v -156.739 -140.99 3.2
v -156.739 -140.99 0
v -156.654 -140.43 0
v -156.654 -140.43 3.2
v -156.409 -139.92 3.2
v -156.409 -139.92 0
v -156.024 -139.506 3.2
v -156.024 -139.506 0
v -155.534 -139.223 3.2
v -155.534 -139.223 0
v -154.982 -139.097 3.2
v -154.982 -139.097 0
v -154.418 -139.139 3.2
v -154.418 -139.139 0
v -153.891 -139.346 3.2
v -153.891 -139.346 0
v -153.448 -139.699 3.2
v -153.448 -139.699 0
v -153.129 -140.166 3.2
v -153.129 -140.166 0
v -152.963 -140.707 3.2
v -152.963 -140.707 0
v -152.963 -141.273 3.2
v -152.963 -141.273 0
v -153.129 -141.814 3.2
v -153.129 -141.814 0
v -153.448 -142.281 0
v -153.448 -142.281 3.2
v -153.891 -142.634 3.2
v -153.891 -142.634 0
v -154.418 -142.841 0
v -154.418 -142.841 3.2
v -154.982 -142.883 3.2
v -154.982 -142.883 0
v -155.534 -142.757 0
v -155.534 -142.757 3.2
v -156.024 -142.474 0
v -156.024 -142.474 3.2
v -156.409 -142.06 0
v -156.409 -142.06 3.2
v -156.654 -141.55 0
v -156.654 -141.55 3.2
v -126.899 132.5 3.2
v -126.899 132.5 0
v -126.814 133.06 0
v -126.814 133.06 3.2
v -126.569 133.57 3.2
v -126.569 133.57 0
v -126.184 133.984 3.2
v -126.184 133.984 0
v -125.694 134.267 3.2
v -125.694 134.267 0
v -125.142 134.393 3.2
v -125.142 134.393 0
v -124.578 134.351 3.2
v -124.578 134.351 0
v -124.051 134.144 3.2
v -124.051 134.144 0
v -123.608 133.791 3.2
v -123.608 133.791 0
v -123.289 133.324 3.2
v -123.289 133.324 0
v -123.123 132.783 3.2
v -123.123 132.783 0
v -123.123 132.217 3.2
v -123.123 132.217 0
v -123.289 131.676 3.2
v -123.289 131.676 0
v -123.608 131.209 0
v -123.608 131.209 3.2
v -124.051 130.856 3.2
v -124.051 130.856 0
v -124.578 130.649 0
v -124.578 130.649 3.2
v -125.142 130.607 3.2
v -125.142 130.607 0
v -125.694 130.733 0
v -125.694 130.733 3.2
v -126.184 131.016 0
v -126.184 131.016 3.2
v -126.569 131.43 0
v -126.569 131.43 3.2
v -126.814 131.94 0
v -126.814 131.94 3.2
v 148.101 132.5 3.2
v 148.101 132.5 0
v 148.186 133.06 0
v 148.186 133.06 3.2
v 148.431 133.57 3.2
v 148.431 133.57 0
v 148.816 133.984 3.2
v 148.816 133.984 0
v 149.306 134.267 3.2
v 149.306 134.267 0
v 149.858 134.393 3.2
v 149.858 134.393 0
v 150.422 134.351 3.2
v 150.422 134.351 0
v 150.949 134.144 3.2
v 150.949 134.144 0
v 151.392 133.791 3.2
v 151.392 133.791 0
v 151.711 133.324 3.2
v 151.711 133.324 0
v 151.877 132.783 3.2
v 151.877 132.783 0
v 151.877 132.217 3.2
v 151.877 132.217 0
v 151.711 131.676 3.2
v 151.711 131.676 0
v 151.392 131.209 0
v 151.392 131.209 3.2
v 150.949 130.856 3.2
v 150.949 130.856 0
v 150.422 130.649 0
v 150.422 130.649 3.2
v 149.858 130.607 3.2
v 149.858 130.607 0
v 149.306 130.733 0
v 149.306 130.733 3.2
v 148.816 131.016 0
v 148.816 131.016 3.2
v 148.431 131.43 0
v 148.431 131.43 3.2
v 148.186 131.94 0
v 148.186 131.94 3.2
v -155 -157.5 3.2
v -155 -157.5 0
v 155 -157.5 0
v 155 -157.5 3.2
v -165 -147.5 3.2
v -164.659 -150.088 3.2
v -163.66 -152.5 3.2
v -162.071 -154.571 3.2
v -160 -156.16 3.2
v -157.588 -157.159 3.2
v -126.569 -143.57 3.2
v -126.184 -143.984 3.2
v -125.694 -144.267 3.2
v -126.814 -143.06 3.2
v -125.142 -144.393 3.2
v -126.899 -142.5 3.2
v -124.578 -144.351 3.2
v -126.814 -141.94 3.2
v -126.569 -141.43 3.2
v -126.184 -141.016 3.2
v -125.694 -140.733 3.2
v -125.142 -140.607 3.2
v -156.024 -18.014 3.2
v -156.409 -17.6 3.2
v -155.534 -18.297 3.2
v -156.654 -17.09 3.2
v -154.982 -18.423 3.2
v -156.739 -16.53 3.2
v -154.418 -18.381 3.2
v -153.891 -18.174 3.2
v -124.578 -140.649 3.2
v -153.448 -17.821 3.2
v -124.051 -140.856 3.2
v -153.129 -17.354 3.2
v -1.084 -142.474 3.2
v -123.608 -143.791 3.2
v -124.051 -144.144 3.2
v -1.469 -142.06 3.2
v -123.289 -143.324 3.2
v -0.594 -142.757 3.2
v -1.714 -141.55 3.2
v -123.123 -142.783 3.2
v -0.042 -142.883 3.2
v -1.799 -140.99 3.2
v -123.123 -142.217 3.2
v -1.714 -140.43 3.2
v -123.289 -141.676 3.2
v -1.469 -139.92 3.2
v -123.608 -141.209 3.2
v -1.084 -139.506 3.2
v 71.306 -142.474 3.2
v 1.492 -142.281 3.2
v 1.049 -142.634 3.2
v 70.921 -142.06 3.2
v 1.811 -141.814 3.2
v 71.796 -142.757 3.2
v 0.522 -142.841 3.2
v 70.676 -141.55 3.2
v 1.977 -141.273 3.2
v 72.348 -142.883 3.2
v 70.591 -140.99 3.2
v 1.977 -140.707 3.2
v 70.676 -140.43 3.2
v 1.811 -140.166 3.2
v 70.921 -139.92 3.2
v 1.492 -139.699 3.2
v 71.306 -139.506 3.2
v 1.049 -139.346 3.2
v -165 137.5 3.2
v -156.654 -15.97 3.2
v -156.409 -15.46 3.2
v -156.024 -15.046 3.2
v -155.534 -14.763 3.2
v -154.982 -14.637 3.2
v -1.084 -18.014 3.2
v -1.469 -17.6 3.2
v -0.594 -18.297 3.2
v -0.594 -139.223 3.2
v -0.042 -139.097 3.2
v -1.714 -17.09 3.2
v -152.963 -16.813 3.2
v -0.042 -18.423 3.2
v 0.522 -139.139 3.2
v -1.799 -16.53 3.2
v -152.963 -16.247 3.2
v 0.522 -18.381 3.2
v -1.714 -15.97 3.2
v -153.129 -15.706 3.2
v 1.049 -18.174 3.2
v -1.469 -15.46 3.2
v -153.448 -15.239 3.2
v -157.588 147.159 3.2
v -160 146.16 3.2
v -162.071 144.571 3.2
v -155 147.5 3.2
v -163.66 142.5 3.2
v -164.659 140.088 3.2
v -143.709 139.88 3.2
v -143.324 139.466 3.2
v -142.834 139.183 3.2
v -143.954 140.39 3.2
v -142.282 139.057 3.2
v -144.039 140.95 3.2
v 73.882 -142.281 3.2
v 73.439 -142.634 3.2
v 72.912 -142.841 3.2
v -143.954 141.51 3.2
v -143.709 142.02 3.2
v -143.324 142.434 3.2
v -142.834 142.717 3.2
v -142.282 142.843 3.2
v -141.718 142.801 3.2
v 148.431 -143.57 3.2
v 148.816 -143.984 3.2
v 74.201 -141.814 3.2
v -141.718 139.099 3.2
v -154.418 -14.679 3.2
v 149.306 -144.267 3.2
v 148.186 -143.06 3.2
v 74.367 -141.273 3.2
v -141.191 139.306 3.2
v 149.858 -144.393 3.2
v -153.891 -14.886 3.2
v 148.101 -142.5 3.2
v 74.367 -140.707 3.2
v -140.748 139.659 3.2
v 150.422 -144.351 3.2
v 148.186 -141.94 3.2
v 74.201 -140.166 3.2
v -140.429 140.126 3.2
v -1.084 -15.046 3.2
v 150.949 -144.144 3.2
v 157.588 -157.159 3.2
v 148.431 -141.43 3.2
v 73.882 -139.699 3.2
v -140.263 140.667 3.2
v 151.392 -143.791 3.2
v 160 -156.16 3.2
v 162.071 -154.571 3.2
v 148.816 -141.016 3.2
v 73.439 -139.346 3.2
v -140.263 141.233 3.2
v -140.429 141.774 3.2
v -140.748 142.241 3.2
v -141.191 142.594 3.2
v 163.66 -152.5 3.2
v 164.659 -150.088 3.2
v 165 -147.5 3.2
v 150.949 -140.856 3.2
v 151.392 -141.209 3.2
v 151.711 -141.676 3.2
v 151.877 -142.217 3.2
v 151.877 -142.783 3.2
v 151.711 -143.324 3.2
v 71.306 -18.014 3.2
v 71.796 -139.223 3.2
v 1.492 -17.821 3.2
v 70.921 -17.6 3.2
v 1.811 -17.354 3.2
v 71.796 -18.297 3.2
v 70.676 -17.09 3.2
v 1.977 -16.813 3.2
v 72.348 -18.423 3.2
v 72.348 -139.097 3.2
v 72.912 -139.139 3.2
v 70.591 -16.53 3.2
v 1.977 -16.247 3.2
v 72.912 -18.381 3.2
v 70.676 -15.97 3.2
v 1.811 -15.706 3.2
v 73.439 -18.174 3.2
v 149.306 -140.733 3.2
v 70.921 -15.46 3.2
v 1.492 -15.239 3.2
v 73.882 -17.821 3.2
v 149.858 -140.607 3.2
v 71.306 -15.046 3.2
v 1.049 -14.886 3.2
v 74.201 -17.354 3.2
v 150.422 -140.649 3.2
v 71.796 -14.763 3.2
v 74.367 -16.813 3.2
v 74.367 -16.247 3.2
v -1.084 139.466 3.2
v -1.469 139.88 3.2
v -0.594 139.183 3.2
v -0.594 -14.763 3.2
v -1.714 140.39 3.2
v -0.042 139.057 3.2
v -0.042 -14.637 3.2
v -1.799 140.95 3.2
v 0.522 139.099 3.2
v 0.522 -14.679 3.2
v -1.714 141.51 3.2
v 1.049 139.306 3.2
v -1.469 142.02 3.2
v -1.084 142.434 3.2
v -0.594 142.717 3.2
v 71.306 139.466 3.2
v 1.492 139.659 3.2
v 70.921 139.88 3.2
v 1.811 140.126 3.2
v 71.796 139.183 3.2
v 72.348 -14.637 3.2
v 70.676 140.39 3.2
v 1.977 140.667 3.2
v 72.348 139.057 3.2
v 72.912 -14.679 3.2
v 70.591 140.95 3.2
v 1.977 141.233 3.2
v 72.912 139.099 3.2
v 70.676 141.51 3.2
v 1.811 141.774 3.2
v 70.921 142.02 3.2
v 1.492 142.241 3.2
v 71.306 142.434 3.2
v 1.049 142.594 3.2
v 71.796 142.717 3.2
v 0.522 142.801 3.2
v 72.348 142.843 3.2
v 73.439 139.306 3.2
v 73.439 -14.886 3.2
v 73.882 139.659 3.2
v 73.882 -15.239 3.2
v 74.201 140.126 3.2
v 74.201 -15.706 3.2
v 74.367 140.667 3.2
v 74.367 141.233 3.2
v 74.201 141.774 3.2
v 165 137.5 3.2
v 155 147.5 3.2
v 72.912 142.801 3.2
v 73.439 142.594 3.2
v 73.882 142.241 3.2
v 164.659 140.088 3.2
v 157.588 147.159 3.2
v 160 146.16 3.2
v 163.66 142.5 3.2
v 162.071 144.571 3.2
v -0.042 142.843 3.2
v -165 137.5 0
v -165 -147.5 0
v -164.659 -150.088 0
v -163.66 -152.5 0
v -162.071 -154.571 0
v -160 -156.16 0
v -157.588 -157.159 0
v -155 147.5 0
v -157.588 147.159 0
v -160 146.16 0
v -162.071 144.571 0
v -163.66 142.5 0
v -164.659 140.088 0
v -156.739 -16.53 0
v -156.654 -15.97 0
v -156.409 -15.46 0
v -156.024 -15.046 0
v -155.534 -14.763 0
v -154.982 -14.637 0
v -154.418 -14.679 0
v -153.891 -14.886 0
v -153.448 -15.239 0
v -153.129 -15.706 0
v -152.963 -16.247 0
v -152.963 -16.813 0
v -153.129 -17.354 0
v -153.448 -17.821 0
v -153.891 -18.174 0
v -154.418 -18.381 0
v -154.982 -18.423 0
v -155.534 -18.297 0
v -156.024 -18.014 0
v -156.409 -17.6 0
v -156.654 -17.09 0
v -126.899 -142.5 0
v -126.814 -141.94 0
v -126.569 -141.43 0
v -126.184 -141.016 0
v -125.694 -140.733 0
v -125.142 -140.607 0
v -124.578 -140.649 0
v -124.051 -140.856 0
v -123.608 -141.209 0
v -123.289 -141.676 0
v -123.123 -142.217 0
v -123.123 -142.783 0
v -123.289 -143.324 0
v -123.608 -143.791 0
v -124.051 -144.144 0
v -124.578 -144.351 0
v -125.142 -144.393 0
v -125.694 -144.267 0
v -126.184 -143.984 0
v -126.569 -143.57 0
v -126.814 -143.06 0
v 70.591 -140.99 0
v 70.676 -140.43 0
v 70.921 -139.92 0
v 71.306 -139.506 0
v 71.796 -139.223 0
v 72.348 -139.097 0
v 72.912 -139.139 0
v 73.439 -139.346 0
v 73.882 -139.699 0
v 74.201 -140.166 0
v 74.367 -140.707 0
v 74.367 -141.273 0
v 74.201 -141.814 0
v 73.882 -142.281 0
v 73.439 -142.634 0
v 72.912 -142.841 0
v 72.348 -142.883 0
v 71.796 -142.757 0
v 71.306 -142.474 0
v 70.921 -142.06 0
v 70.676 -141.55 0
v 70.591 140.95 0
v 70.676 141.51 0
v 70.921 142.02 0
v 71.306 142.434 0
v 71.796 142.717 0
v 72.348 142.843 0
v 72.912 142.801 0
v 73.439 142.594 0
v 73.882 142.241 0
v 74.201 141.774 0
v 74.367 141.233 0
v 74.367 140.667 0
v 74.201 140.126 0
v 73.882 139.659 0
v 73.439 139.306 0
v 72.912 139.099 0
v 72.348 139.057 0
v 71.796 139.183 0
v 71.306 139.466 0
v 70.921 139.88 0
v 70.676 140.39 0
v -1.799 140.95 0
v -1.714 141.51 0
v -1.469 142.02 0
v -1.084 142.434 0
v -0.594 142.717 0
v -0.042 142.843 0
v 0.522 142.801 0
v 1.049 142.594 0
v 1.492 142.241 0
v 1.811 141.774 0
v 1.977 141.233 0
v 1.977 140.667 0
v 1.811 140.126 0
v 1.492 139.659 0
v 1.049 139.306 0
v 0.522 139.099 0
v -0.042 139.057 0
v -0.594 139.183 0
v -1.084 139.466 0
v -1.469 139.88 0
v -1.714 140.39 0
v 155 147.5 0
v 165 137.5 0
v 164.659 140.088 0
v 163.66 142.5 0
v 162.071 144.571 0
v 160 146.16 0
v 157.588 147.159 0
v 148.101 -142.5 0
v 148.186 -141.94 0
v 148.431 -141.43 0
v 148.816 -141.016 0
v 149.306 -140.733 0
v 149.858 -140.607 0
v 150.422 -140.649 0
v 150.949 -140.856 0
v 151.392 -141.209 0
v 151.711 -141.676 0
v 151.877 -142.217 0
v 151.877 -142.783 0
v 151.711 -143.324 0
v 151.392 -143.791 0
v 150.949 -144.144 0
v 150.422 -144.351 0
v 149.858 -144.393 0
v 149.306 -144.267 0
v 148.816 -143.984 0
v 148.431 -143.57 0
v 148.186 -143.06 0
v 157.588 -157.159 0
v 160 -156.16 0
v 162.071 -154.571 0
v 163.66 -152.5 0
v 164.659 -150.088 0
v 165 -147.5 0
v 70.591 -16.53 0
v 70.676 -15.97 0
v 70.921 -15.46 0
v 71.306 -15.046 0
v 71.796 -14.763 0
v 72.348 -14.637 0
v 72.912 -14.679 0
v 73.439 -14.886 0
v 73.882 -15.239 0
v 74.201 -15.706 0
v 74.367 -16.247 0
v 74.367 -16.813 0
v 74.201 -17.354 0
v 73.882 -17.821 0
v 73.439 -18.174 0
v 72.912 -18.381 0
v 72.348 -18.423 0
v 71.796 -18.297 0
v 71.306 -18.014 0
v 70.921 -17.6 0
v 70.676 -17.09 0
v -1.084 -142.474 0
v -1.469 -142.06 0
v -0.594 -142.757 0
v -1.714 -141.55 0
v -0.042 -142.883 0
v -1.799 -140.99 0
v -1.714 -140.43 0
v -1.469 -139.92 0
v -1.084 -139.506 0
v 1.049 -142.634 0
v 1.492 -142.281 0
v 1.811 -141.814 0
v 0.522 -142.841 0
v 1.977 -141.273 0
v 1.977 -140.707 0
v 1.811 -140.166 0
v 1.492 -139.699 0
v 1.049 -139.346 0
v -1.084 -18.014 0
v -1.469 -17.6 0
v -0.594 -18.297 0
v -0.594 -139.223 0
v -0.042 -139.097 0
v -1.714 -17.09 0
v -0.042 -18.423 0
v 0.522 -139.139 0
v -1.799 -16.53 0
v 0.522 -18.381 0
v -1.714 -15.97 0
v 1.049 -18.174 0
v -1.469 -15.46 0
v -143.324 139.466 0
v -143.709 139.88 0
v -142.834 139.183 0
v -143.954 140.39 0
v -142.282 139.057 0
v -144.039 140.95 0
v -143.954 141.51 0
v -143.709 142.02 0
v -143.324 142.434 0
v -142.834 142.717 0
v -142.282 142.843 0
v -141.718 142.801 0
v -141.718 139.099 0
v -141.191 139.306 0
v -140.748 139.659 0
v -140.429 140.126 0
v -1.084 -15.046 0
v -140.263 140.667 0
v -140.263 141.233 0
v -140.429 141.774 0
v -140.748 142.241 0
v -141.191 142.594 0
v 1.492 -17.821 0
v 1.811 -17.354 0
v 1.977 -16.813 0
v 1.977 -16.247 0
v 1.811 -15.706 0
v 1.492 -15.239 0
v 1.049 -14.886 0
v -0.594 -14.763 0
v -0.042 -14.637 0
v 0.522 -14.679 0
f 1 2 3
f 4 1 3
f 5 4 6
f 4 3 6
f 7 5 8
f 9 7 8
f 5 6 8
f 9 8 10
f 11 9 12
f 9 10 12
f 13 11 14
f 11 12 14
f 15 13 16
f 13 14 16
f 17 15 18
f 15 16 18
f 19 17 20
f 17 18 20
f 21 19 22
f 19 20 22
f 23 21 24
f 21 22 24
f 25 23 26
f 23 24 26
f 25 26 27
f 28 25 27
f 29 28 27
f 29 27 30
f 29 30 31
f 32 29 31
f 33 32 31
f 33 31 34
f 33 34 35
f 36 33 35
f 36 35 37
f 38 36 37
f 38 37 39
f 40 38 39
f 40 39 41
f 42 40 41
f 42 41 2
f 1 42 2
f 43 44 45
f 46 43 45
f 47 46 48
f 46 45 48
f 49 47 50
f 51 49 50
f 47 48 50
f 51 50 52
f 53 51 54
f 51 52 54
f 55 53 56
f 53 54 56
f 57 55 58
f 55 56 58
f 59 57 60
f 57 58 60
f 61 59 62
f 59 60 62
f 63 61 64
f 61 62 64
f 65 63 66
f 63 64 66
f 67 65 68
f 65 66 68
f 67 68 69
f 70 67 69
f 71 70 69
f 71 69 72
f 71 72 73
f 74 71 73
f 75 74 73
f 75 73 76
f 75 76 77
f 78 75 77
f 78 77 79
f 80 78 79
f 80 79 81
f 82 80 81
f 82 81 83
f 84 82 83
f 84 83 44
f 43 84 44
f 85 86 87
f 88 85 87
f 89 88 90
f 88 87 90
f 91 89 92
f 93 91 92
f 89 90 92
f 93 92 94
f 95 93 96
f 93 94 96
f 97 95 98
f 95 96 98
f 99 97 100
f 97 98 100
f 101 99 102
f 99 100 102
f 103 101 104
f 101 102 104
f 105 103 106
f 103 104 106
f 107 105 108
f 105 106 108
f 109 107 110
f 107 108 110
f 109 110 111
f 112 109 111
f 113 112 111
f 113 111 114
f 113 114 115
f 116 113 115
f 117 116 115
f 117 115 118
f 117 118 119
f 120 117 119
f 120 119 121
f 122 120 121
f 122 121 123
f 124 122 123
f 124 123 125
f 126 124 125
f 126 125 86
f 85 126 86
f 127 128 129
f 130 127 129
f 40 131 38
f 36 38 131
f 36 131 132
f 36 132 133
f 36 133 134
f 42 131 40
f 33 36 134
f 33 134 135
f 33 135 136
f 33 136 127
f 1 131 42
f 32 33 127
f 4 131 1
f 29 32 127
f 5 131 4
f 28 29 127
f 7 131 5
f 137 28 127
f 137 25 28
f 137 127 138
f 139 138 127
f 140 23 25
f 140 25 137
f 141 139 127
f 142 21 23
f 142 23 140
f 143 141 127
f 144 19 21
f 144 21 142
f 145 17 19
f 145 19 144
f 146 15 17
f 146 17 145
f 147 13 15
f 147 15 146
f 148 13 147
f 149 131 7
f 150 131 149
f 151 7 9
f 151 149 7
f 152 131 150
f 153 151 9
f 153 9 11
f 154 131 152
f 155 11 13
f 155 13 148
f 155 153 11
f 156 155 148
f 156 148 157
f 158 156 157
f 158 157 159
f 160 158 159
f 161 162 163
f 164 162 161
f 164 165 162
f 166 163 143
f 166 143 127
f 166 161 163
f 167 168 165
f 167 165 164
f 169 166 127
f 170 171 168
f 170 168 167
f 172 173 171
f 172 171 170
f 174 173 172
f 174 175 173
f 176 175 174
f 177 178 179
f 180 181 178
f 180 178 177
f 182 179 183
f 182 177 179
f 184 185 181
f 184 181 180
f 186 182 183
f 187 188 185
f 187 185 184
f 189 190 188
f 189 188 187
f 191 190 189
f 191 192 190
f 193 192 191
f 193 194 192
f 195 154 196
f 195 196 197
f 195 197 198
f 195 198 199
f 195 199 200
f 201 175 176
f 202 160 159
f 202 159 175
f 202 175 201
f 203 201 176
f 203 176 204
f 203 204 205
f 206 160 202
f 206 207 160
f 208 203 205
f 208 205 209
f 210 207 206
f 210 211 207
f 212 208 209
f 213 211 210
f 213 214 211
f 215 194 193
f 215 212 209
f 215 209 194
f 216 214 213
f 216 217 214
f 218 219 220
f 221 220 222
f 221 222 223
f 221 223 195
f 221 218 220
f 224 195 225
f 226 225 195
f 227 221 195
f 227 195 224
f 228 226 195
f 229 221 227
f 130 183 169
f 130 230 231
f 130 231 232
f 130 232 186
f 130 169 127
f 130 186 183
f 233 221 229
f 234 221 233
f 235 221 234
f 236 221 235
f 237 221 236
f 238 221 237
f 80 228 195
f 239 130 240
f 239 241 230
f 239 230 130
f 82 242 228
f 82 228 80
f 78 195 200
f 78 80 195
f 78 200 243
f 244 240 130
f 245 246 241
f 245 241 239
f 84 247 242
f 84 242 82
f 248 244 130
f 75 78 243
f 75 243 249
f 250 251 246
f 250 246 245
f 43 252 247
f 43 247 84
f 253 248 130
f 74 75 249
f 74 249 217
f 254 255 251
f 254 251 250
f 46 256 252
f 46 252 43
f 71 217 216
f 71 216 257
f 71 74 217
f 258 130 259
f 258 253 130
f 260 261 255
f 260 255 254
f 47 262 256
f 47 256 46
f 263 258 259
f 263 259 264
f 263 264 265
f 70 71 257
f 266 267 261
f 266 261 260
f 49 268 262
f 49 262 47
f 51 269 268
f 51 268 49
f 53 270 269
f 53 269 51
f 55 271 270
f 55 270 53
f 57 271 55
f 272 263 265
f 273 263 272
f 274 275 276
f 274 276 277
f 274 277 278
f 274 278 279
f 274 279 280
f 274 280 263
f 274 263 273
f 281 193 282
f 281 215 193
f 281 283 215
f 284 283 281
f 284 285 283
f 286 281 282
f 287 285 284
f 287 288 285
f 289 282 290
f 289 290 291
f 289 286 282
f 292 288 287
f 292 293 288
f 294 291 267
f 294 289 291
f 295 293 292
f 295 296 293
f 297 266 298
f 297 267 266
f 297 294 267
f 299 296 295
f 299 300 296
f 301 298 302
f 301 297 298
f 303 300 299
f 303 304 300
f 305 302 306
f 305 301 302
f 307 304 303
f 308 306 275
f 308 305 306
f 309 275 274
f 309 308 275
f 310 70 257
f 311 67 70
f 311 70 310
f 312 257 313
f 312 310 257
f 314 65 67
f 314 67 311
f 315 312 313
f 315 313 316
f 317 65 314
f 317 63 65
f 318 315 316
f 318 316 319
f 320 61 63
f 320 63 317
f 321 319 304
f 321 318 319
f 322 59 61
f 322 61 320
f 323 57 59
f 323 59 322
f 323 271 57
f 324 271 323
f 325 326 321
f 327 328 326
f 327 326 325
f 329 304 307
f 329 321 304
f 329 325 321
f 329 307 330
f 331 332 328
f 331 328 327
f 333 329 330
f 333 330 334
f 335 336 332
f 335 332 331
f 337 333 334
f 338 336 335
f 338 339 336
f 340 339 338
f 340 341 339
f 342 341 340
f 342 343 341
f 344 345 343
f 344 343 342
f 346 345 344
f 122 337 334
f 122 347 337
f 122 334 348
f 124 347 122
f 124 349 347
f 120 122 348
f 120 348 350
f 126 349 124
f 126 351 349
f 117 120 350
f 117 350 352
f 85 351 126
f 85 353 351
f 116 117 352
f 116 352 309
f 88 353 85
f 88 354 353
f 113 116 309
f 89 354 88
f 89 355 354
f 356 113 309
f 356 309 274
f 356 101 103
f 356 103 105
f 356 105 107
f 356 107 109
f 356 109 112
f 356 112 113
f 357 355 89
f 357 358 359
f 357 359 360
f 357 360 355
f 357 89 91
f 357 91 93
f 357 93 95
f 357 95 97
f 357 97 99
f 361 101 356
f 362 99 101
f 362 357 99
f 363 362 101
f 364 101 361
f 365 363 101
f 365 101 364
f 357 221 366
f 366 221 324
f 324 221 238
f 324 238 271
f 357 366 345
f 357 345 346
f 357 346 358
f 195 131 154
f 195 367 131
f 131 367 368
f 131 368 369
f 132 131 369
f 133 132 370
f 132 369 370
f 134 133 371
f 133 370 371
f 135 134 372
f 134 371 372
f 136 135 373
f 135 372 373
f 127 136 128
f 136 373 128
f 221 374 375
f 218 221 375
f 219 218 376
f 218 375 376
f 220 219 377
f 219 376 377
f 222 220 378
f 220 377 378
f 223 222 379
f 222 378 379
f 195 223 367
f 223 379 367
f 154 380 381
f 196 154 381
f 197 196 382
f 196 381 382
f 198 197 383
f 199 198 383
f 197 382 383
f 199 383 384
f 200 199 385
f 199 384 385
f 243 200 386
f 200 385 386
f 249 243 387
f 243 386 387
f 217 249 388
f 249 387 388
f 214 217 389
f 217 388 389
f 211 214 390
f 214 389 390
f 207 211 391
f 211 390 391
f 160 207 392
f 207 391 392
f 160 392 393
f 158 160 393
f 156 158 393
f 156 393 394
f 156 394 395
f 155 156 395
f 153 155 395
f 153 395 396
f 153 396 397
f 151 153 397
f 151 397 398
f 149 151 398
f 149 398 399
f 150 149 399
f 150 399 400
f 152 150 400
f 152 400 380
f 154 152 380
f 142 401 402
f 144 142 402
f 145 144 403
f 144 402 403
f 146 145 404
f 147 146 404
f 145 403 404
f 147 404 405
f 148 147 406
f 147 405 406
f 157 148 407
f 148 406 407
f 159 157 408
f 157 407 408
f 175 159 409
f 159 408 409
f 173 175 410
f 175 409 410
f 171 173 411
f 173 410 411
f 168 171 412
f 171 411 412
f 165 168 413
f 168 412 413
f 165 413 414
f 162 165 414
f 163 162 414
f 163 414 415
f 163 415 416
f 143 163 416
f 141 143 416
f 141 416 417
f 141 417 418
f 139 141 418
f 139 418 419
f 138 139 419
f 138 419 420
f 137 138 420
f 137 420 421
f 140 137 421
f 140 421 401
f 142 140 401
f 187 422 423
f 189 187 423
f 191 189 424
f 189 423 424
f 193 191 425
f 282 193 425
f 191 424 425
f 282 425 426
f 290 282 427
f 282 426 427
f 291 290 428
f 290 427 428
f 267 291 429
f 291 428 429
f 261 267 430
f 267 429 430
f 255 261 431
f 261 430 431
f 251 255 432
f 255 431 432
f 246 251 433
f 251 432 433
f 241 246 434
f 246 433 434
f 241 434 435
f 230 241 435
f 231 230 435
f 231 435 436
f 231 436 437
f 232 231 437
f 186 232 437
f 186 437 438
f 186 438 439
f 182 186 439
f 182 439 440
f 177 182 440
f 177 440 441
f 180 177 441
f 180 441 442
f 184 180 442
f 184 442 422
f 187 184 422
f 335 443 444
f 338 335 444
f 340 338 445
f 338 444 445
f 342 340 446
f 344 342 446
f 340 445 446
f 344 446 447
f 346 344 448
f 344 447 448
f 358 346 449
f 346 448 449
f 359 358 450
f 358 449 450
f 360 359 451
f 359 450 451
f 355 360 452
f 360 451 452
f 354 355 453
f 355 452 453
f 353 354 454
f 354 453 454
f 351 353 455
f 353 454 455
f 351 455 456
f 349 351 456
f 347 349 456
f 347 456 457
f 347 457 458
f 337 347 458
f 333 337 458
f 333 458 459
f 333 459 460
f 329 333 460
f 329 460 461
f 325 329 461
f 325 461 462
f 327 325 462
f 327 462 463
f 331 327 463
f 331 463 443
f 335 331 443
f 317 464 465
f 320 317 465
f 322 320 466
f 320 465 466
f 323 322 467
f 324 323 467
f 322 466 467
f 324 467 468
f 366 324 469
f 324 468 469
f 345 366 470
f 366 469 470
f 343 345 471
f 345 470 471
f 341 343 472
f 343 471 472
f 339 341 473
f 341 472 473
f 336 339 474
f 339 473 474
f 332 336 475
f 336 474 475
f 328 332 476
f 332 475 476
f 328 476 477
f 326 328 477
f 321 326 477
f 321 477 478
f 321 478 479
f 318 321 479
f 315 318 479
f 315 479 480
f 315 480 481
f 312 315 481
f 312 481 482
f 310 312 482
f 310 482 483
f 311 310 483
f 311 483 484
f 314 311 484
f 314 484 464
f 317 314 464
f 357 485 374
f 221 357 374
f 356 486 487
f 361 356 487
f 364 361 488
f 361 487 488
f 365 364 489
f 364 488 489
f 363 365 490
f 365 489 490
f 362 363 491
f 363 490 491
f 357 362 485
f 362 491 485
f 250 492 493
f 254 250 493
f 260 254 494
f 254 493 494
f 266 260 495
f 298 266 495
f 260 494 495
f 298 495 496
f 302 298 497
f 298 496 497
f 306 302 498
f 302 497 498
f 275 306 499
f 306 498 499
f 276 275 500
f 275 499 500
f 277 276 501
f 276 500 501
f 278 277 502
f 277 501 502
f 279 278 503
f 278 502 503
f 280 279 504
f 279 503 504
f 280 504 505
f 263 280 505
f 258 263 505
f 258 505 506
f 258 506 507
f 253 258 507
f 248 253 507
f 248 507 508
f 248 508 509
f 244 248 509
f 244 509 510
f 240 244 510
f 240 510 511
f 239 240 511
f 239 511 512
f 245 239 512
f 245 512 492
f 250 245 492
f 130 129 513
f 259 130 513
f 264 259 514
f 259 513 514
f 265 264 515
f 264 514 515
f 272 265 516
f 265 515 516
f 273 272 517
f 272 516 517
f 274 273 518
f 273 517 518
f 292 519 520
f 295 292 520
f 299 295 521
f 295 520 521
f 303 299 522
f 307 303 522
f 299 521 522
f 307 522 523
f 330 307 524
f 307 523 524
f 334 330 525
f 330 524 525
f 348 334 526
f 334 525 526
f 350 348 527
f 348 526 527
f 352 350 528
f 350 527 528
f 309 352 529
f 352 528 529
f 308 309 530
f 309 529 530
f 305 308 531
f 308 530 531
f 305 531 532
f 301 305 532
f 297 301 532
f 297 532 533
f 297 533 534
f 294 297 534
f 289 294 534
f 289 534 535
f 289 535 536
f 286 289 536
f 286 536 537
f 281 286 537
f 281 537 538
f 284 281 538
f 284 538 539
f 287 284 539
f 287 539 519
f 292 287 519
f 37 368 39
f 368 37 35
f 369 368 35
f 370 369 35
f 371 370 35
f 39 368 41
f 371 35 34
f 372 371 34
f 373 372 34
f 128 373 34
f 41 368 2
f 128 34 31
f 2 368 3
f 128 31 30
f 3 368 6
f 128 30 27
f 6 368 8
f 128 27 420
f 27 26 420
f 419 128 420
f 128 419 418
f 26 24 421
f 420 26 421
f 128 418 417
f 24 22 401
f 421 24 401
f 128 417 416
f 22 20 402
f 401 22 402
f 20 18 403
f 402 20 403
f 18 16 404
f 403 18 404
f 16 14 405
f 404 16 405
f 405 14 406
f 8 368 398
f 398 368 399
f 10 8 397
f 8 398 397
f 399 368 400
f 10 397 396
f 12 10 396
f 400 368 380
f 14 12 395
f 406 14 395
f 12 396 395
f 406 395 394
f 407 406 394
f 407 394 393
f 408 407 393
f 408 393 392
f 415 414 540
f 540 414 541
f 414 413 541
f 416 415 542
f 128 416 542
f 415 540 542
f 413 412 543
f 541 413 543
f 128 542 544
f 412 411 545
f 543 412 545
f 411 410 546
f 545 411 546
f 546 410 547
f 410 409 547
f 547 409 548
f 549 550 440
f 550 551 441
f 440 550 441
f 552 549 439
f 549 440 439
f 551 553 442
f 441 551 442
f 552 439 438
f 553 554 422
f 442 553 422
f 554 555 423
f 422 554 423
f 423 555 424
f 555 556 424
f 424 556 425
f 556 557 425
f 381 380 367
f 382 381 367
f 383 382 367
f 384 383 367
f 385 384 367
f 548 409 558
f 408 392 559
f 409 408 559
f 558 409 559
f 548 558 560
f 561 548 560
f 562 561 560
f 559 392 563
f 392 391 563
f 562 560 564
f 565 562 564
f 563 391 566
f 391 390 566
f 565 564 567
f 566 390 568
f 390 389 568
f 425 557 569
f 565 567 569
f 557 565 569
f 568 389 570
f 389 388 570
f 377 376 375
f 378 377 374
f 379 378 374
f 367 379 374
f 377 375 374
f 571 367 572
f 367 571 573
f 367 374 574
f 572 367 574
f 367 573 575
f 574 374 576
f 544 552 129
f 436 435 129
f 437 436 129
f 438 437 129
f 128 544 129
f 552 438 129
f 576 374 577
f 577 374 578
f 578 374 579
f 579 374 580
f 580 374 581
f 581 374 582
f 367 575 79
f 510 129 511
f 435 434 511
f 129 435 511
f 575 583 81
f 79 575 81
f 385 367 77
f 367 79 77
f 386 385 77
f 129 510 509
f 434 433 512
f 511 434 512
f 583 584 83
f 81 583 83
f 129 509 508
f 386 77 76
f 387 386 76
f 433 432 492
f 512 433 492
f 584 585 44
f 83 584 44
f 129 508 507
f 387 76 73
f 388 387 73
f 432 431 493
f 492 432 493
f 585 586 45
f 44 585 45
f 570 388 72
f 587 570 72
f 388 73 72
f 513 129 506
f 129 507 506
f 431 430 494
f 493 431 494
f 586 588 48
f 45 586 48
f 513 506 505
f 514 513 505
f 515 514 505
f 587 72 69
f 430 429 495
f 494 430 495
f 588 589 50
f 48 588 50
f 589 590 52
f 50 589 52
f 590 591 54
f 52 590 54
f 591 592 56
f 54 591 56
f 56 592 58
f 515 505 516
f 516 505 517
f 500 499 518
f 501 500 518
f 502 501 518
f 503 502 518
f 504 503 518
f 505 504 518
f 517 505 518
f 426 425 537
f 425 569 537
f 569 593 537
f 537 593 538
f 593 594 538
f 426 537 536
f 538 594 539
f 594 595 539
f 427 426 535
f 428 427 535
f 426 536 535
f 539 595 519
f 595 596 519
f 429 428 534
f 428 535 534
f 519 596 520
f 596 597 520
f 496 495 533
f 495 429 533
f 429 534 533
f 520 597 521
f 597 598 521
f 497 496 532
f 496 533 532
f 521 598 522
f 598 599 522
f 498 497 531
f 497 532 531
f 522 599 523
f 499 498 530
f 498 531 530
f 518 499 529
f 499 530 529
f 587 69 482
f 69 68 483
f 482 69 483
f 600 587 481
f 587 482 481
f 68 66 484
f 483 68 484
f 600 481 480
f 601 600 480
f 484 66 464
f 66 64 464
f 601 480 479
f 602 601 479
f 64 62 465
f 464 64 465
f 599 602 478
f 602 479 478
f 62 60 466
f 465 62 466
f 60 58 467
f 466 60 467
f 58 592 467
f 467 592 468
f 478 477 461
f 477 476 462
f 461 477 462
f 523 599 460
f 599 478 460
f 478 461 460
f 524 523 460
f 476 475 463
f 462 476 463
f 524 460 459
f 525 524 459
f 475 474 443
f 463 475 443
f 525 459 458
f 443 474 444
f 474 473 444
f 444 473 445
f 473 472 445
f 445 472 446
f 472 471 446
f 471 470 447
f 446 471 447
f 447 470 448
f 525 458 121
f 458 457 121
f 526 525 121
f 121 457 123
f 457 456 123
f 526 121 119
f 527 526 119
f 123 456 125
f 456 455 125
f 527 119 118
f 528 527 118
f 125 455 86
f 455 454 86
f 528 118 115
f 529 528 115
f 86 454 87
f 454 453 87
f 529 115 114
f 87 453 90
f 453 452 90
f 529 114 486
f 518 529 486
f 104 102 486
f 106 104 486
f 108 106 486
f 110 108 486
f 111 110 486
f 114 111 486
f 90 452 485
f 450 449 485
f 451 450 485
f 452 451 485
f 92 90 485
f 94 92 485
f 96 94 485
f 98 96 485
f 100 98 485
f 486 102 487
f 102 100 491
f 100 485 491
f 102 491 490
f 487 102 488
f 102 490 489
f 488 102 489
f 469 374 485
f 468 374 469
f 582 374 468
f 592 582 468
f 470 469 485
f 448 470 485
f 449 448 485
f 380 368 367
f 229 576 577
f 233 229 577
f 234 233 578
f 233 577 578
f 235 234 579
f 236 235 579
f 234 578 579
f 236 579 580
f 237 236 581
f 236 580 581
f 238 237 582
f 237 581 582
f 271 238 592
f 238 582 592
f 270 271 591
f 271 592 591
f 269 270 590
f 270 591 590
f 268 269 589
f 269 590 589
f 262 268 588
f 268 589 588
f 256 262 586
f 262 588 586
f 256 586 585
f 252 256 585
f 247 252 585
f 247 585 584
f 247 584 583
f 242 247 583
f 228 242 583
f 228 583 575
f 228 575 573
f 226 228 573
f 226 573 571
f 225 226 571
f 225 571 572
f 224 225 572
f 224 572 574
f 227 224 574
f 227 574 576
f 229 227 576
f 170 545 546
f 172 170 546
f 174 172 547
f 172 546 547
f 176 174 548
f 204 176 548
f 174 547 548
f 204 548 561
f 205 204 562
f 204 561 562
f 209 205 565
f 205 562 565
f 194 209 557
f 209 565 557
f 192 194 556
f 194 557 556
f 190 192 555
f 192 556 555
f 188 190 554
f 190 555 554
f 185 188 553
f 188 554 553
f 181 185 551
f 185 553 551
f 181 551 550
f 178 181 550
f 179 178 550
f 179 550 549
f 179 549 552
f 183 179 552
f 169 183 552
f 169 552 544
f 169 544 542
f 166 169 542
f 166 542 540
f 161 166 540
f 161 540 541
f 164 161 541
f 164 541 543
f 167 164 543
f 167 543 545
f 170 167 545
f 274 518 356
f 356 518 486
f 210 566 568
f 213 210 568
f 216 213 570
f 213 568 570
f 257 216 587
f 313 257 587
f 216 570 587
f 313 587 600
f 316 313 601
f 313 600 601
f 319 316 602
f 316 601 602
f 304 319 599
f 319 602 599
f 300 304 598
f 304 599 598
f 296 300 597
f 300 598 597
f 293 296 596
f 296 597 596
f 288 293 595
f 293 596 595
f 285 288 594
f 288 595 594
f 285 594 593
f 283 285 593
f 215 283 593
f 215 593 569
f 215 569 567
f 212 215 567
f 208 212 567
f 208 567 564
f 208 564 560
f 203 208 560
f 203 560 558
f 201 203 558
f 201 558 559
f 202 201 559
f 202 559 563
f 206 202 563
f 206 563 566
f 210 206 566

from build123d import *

# Parameters (mm, degrees)
F1_DEPTH = 3.2
F3_D     = 3.7973
F5_D     = 3.7973


with BuildPart() as f1:
    # F0 (on Top) → F1 (new body)
    with BuildSketch(Plane.XY):
        with BuildLine():
            ThreePointArc((165, 137.5), (162.0710678119, 144.5710678119), (155, 147.5))
            Line((155, 147.5), (-155, 147.5))
            ThreePointArc((-155, 147.5), (-162.0710678119, 144.5710678119), (-165, 137.5))
            Line((-165, 137.5), (-165, -147.5))
            ThreePointArc((-165, -147.5), (-162.0710678119, -154.5710678119), (-155, -157.5))
            Line((-155, -157.5), (155, -157.5))
            ThreePointArc((155, -157.5), (162.0710678119, -154.5710678119), (165, -147.5))
            Line((165, -147.5), (165, 137.5))
        make_face()
    extrude(amount=F1_DEPTH)

    # F3 (through all)
    with Locations(Plane.XY.offset(3.2)):
        with Locations((-125, 132.5), (150, 132.5), (150, -142.5), (-125, -142.5)):
            Hole(F3_D / 2)

    # F5 (through all)
    with Locations(Plane.XY.offset(3.2)):
        with Locations((-142.14, 140.95), (0.1, 140.95), (72.49, 140.95), (-154.84, -16.53), (0.1, -16.53), (72.49, -16.53), (72.49, -140.99), (0.1, -140.99), (-154.84, -140.99)):
            Hole(F5_D / 2)


solid = f1.part
